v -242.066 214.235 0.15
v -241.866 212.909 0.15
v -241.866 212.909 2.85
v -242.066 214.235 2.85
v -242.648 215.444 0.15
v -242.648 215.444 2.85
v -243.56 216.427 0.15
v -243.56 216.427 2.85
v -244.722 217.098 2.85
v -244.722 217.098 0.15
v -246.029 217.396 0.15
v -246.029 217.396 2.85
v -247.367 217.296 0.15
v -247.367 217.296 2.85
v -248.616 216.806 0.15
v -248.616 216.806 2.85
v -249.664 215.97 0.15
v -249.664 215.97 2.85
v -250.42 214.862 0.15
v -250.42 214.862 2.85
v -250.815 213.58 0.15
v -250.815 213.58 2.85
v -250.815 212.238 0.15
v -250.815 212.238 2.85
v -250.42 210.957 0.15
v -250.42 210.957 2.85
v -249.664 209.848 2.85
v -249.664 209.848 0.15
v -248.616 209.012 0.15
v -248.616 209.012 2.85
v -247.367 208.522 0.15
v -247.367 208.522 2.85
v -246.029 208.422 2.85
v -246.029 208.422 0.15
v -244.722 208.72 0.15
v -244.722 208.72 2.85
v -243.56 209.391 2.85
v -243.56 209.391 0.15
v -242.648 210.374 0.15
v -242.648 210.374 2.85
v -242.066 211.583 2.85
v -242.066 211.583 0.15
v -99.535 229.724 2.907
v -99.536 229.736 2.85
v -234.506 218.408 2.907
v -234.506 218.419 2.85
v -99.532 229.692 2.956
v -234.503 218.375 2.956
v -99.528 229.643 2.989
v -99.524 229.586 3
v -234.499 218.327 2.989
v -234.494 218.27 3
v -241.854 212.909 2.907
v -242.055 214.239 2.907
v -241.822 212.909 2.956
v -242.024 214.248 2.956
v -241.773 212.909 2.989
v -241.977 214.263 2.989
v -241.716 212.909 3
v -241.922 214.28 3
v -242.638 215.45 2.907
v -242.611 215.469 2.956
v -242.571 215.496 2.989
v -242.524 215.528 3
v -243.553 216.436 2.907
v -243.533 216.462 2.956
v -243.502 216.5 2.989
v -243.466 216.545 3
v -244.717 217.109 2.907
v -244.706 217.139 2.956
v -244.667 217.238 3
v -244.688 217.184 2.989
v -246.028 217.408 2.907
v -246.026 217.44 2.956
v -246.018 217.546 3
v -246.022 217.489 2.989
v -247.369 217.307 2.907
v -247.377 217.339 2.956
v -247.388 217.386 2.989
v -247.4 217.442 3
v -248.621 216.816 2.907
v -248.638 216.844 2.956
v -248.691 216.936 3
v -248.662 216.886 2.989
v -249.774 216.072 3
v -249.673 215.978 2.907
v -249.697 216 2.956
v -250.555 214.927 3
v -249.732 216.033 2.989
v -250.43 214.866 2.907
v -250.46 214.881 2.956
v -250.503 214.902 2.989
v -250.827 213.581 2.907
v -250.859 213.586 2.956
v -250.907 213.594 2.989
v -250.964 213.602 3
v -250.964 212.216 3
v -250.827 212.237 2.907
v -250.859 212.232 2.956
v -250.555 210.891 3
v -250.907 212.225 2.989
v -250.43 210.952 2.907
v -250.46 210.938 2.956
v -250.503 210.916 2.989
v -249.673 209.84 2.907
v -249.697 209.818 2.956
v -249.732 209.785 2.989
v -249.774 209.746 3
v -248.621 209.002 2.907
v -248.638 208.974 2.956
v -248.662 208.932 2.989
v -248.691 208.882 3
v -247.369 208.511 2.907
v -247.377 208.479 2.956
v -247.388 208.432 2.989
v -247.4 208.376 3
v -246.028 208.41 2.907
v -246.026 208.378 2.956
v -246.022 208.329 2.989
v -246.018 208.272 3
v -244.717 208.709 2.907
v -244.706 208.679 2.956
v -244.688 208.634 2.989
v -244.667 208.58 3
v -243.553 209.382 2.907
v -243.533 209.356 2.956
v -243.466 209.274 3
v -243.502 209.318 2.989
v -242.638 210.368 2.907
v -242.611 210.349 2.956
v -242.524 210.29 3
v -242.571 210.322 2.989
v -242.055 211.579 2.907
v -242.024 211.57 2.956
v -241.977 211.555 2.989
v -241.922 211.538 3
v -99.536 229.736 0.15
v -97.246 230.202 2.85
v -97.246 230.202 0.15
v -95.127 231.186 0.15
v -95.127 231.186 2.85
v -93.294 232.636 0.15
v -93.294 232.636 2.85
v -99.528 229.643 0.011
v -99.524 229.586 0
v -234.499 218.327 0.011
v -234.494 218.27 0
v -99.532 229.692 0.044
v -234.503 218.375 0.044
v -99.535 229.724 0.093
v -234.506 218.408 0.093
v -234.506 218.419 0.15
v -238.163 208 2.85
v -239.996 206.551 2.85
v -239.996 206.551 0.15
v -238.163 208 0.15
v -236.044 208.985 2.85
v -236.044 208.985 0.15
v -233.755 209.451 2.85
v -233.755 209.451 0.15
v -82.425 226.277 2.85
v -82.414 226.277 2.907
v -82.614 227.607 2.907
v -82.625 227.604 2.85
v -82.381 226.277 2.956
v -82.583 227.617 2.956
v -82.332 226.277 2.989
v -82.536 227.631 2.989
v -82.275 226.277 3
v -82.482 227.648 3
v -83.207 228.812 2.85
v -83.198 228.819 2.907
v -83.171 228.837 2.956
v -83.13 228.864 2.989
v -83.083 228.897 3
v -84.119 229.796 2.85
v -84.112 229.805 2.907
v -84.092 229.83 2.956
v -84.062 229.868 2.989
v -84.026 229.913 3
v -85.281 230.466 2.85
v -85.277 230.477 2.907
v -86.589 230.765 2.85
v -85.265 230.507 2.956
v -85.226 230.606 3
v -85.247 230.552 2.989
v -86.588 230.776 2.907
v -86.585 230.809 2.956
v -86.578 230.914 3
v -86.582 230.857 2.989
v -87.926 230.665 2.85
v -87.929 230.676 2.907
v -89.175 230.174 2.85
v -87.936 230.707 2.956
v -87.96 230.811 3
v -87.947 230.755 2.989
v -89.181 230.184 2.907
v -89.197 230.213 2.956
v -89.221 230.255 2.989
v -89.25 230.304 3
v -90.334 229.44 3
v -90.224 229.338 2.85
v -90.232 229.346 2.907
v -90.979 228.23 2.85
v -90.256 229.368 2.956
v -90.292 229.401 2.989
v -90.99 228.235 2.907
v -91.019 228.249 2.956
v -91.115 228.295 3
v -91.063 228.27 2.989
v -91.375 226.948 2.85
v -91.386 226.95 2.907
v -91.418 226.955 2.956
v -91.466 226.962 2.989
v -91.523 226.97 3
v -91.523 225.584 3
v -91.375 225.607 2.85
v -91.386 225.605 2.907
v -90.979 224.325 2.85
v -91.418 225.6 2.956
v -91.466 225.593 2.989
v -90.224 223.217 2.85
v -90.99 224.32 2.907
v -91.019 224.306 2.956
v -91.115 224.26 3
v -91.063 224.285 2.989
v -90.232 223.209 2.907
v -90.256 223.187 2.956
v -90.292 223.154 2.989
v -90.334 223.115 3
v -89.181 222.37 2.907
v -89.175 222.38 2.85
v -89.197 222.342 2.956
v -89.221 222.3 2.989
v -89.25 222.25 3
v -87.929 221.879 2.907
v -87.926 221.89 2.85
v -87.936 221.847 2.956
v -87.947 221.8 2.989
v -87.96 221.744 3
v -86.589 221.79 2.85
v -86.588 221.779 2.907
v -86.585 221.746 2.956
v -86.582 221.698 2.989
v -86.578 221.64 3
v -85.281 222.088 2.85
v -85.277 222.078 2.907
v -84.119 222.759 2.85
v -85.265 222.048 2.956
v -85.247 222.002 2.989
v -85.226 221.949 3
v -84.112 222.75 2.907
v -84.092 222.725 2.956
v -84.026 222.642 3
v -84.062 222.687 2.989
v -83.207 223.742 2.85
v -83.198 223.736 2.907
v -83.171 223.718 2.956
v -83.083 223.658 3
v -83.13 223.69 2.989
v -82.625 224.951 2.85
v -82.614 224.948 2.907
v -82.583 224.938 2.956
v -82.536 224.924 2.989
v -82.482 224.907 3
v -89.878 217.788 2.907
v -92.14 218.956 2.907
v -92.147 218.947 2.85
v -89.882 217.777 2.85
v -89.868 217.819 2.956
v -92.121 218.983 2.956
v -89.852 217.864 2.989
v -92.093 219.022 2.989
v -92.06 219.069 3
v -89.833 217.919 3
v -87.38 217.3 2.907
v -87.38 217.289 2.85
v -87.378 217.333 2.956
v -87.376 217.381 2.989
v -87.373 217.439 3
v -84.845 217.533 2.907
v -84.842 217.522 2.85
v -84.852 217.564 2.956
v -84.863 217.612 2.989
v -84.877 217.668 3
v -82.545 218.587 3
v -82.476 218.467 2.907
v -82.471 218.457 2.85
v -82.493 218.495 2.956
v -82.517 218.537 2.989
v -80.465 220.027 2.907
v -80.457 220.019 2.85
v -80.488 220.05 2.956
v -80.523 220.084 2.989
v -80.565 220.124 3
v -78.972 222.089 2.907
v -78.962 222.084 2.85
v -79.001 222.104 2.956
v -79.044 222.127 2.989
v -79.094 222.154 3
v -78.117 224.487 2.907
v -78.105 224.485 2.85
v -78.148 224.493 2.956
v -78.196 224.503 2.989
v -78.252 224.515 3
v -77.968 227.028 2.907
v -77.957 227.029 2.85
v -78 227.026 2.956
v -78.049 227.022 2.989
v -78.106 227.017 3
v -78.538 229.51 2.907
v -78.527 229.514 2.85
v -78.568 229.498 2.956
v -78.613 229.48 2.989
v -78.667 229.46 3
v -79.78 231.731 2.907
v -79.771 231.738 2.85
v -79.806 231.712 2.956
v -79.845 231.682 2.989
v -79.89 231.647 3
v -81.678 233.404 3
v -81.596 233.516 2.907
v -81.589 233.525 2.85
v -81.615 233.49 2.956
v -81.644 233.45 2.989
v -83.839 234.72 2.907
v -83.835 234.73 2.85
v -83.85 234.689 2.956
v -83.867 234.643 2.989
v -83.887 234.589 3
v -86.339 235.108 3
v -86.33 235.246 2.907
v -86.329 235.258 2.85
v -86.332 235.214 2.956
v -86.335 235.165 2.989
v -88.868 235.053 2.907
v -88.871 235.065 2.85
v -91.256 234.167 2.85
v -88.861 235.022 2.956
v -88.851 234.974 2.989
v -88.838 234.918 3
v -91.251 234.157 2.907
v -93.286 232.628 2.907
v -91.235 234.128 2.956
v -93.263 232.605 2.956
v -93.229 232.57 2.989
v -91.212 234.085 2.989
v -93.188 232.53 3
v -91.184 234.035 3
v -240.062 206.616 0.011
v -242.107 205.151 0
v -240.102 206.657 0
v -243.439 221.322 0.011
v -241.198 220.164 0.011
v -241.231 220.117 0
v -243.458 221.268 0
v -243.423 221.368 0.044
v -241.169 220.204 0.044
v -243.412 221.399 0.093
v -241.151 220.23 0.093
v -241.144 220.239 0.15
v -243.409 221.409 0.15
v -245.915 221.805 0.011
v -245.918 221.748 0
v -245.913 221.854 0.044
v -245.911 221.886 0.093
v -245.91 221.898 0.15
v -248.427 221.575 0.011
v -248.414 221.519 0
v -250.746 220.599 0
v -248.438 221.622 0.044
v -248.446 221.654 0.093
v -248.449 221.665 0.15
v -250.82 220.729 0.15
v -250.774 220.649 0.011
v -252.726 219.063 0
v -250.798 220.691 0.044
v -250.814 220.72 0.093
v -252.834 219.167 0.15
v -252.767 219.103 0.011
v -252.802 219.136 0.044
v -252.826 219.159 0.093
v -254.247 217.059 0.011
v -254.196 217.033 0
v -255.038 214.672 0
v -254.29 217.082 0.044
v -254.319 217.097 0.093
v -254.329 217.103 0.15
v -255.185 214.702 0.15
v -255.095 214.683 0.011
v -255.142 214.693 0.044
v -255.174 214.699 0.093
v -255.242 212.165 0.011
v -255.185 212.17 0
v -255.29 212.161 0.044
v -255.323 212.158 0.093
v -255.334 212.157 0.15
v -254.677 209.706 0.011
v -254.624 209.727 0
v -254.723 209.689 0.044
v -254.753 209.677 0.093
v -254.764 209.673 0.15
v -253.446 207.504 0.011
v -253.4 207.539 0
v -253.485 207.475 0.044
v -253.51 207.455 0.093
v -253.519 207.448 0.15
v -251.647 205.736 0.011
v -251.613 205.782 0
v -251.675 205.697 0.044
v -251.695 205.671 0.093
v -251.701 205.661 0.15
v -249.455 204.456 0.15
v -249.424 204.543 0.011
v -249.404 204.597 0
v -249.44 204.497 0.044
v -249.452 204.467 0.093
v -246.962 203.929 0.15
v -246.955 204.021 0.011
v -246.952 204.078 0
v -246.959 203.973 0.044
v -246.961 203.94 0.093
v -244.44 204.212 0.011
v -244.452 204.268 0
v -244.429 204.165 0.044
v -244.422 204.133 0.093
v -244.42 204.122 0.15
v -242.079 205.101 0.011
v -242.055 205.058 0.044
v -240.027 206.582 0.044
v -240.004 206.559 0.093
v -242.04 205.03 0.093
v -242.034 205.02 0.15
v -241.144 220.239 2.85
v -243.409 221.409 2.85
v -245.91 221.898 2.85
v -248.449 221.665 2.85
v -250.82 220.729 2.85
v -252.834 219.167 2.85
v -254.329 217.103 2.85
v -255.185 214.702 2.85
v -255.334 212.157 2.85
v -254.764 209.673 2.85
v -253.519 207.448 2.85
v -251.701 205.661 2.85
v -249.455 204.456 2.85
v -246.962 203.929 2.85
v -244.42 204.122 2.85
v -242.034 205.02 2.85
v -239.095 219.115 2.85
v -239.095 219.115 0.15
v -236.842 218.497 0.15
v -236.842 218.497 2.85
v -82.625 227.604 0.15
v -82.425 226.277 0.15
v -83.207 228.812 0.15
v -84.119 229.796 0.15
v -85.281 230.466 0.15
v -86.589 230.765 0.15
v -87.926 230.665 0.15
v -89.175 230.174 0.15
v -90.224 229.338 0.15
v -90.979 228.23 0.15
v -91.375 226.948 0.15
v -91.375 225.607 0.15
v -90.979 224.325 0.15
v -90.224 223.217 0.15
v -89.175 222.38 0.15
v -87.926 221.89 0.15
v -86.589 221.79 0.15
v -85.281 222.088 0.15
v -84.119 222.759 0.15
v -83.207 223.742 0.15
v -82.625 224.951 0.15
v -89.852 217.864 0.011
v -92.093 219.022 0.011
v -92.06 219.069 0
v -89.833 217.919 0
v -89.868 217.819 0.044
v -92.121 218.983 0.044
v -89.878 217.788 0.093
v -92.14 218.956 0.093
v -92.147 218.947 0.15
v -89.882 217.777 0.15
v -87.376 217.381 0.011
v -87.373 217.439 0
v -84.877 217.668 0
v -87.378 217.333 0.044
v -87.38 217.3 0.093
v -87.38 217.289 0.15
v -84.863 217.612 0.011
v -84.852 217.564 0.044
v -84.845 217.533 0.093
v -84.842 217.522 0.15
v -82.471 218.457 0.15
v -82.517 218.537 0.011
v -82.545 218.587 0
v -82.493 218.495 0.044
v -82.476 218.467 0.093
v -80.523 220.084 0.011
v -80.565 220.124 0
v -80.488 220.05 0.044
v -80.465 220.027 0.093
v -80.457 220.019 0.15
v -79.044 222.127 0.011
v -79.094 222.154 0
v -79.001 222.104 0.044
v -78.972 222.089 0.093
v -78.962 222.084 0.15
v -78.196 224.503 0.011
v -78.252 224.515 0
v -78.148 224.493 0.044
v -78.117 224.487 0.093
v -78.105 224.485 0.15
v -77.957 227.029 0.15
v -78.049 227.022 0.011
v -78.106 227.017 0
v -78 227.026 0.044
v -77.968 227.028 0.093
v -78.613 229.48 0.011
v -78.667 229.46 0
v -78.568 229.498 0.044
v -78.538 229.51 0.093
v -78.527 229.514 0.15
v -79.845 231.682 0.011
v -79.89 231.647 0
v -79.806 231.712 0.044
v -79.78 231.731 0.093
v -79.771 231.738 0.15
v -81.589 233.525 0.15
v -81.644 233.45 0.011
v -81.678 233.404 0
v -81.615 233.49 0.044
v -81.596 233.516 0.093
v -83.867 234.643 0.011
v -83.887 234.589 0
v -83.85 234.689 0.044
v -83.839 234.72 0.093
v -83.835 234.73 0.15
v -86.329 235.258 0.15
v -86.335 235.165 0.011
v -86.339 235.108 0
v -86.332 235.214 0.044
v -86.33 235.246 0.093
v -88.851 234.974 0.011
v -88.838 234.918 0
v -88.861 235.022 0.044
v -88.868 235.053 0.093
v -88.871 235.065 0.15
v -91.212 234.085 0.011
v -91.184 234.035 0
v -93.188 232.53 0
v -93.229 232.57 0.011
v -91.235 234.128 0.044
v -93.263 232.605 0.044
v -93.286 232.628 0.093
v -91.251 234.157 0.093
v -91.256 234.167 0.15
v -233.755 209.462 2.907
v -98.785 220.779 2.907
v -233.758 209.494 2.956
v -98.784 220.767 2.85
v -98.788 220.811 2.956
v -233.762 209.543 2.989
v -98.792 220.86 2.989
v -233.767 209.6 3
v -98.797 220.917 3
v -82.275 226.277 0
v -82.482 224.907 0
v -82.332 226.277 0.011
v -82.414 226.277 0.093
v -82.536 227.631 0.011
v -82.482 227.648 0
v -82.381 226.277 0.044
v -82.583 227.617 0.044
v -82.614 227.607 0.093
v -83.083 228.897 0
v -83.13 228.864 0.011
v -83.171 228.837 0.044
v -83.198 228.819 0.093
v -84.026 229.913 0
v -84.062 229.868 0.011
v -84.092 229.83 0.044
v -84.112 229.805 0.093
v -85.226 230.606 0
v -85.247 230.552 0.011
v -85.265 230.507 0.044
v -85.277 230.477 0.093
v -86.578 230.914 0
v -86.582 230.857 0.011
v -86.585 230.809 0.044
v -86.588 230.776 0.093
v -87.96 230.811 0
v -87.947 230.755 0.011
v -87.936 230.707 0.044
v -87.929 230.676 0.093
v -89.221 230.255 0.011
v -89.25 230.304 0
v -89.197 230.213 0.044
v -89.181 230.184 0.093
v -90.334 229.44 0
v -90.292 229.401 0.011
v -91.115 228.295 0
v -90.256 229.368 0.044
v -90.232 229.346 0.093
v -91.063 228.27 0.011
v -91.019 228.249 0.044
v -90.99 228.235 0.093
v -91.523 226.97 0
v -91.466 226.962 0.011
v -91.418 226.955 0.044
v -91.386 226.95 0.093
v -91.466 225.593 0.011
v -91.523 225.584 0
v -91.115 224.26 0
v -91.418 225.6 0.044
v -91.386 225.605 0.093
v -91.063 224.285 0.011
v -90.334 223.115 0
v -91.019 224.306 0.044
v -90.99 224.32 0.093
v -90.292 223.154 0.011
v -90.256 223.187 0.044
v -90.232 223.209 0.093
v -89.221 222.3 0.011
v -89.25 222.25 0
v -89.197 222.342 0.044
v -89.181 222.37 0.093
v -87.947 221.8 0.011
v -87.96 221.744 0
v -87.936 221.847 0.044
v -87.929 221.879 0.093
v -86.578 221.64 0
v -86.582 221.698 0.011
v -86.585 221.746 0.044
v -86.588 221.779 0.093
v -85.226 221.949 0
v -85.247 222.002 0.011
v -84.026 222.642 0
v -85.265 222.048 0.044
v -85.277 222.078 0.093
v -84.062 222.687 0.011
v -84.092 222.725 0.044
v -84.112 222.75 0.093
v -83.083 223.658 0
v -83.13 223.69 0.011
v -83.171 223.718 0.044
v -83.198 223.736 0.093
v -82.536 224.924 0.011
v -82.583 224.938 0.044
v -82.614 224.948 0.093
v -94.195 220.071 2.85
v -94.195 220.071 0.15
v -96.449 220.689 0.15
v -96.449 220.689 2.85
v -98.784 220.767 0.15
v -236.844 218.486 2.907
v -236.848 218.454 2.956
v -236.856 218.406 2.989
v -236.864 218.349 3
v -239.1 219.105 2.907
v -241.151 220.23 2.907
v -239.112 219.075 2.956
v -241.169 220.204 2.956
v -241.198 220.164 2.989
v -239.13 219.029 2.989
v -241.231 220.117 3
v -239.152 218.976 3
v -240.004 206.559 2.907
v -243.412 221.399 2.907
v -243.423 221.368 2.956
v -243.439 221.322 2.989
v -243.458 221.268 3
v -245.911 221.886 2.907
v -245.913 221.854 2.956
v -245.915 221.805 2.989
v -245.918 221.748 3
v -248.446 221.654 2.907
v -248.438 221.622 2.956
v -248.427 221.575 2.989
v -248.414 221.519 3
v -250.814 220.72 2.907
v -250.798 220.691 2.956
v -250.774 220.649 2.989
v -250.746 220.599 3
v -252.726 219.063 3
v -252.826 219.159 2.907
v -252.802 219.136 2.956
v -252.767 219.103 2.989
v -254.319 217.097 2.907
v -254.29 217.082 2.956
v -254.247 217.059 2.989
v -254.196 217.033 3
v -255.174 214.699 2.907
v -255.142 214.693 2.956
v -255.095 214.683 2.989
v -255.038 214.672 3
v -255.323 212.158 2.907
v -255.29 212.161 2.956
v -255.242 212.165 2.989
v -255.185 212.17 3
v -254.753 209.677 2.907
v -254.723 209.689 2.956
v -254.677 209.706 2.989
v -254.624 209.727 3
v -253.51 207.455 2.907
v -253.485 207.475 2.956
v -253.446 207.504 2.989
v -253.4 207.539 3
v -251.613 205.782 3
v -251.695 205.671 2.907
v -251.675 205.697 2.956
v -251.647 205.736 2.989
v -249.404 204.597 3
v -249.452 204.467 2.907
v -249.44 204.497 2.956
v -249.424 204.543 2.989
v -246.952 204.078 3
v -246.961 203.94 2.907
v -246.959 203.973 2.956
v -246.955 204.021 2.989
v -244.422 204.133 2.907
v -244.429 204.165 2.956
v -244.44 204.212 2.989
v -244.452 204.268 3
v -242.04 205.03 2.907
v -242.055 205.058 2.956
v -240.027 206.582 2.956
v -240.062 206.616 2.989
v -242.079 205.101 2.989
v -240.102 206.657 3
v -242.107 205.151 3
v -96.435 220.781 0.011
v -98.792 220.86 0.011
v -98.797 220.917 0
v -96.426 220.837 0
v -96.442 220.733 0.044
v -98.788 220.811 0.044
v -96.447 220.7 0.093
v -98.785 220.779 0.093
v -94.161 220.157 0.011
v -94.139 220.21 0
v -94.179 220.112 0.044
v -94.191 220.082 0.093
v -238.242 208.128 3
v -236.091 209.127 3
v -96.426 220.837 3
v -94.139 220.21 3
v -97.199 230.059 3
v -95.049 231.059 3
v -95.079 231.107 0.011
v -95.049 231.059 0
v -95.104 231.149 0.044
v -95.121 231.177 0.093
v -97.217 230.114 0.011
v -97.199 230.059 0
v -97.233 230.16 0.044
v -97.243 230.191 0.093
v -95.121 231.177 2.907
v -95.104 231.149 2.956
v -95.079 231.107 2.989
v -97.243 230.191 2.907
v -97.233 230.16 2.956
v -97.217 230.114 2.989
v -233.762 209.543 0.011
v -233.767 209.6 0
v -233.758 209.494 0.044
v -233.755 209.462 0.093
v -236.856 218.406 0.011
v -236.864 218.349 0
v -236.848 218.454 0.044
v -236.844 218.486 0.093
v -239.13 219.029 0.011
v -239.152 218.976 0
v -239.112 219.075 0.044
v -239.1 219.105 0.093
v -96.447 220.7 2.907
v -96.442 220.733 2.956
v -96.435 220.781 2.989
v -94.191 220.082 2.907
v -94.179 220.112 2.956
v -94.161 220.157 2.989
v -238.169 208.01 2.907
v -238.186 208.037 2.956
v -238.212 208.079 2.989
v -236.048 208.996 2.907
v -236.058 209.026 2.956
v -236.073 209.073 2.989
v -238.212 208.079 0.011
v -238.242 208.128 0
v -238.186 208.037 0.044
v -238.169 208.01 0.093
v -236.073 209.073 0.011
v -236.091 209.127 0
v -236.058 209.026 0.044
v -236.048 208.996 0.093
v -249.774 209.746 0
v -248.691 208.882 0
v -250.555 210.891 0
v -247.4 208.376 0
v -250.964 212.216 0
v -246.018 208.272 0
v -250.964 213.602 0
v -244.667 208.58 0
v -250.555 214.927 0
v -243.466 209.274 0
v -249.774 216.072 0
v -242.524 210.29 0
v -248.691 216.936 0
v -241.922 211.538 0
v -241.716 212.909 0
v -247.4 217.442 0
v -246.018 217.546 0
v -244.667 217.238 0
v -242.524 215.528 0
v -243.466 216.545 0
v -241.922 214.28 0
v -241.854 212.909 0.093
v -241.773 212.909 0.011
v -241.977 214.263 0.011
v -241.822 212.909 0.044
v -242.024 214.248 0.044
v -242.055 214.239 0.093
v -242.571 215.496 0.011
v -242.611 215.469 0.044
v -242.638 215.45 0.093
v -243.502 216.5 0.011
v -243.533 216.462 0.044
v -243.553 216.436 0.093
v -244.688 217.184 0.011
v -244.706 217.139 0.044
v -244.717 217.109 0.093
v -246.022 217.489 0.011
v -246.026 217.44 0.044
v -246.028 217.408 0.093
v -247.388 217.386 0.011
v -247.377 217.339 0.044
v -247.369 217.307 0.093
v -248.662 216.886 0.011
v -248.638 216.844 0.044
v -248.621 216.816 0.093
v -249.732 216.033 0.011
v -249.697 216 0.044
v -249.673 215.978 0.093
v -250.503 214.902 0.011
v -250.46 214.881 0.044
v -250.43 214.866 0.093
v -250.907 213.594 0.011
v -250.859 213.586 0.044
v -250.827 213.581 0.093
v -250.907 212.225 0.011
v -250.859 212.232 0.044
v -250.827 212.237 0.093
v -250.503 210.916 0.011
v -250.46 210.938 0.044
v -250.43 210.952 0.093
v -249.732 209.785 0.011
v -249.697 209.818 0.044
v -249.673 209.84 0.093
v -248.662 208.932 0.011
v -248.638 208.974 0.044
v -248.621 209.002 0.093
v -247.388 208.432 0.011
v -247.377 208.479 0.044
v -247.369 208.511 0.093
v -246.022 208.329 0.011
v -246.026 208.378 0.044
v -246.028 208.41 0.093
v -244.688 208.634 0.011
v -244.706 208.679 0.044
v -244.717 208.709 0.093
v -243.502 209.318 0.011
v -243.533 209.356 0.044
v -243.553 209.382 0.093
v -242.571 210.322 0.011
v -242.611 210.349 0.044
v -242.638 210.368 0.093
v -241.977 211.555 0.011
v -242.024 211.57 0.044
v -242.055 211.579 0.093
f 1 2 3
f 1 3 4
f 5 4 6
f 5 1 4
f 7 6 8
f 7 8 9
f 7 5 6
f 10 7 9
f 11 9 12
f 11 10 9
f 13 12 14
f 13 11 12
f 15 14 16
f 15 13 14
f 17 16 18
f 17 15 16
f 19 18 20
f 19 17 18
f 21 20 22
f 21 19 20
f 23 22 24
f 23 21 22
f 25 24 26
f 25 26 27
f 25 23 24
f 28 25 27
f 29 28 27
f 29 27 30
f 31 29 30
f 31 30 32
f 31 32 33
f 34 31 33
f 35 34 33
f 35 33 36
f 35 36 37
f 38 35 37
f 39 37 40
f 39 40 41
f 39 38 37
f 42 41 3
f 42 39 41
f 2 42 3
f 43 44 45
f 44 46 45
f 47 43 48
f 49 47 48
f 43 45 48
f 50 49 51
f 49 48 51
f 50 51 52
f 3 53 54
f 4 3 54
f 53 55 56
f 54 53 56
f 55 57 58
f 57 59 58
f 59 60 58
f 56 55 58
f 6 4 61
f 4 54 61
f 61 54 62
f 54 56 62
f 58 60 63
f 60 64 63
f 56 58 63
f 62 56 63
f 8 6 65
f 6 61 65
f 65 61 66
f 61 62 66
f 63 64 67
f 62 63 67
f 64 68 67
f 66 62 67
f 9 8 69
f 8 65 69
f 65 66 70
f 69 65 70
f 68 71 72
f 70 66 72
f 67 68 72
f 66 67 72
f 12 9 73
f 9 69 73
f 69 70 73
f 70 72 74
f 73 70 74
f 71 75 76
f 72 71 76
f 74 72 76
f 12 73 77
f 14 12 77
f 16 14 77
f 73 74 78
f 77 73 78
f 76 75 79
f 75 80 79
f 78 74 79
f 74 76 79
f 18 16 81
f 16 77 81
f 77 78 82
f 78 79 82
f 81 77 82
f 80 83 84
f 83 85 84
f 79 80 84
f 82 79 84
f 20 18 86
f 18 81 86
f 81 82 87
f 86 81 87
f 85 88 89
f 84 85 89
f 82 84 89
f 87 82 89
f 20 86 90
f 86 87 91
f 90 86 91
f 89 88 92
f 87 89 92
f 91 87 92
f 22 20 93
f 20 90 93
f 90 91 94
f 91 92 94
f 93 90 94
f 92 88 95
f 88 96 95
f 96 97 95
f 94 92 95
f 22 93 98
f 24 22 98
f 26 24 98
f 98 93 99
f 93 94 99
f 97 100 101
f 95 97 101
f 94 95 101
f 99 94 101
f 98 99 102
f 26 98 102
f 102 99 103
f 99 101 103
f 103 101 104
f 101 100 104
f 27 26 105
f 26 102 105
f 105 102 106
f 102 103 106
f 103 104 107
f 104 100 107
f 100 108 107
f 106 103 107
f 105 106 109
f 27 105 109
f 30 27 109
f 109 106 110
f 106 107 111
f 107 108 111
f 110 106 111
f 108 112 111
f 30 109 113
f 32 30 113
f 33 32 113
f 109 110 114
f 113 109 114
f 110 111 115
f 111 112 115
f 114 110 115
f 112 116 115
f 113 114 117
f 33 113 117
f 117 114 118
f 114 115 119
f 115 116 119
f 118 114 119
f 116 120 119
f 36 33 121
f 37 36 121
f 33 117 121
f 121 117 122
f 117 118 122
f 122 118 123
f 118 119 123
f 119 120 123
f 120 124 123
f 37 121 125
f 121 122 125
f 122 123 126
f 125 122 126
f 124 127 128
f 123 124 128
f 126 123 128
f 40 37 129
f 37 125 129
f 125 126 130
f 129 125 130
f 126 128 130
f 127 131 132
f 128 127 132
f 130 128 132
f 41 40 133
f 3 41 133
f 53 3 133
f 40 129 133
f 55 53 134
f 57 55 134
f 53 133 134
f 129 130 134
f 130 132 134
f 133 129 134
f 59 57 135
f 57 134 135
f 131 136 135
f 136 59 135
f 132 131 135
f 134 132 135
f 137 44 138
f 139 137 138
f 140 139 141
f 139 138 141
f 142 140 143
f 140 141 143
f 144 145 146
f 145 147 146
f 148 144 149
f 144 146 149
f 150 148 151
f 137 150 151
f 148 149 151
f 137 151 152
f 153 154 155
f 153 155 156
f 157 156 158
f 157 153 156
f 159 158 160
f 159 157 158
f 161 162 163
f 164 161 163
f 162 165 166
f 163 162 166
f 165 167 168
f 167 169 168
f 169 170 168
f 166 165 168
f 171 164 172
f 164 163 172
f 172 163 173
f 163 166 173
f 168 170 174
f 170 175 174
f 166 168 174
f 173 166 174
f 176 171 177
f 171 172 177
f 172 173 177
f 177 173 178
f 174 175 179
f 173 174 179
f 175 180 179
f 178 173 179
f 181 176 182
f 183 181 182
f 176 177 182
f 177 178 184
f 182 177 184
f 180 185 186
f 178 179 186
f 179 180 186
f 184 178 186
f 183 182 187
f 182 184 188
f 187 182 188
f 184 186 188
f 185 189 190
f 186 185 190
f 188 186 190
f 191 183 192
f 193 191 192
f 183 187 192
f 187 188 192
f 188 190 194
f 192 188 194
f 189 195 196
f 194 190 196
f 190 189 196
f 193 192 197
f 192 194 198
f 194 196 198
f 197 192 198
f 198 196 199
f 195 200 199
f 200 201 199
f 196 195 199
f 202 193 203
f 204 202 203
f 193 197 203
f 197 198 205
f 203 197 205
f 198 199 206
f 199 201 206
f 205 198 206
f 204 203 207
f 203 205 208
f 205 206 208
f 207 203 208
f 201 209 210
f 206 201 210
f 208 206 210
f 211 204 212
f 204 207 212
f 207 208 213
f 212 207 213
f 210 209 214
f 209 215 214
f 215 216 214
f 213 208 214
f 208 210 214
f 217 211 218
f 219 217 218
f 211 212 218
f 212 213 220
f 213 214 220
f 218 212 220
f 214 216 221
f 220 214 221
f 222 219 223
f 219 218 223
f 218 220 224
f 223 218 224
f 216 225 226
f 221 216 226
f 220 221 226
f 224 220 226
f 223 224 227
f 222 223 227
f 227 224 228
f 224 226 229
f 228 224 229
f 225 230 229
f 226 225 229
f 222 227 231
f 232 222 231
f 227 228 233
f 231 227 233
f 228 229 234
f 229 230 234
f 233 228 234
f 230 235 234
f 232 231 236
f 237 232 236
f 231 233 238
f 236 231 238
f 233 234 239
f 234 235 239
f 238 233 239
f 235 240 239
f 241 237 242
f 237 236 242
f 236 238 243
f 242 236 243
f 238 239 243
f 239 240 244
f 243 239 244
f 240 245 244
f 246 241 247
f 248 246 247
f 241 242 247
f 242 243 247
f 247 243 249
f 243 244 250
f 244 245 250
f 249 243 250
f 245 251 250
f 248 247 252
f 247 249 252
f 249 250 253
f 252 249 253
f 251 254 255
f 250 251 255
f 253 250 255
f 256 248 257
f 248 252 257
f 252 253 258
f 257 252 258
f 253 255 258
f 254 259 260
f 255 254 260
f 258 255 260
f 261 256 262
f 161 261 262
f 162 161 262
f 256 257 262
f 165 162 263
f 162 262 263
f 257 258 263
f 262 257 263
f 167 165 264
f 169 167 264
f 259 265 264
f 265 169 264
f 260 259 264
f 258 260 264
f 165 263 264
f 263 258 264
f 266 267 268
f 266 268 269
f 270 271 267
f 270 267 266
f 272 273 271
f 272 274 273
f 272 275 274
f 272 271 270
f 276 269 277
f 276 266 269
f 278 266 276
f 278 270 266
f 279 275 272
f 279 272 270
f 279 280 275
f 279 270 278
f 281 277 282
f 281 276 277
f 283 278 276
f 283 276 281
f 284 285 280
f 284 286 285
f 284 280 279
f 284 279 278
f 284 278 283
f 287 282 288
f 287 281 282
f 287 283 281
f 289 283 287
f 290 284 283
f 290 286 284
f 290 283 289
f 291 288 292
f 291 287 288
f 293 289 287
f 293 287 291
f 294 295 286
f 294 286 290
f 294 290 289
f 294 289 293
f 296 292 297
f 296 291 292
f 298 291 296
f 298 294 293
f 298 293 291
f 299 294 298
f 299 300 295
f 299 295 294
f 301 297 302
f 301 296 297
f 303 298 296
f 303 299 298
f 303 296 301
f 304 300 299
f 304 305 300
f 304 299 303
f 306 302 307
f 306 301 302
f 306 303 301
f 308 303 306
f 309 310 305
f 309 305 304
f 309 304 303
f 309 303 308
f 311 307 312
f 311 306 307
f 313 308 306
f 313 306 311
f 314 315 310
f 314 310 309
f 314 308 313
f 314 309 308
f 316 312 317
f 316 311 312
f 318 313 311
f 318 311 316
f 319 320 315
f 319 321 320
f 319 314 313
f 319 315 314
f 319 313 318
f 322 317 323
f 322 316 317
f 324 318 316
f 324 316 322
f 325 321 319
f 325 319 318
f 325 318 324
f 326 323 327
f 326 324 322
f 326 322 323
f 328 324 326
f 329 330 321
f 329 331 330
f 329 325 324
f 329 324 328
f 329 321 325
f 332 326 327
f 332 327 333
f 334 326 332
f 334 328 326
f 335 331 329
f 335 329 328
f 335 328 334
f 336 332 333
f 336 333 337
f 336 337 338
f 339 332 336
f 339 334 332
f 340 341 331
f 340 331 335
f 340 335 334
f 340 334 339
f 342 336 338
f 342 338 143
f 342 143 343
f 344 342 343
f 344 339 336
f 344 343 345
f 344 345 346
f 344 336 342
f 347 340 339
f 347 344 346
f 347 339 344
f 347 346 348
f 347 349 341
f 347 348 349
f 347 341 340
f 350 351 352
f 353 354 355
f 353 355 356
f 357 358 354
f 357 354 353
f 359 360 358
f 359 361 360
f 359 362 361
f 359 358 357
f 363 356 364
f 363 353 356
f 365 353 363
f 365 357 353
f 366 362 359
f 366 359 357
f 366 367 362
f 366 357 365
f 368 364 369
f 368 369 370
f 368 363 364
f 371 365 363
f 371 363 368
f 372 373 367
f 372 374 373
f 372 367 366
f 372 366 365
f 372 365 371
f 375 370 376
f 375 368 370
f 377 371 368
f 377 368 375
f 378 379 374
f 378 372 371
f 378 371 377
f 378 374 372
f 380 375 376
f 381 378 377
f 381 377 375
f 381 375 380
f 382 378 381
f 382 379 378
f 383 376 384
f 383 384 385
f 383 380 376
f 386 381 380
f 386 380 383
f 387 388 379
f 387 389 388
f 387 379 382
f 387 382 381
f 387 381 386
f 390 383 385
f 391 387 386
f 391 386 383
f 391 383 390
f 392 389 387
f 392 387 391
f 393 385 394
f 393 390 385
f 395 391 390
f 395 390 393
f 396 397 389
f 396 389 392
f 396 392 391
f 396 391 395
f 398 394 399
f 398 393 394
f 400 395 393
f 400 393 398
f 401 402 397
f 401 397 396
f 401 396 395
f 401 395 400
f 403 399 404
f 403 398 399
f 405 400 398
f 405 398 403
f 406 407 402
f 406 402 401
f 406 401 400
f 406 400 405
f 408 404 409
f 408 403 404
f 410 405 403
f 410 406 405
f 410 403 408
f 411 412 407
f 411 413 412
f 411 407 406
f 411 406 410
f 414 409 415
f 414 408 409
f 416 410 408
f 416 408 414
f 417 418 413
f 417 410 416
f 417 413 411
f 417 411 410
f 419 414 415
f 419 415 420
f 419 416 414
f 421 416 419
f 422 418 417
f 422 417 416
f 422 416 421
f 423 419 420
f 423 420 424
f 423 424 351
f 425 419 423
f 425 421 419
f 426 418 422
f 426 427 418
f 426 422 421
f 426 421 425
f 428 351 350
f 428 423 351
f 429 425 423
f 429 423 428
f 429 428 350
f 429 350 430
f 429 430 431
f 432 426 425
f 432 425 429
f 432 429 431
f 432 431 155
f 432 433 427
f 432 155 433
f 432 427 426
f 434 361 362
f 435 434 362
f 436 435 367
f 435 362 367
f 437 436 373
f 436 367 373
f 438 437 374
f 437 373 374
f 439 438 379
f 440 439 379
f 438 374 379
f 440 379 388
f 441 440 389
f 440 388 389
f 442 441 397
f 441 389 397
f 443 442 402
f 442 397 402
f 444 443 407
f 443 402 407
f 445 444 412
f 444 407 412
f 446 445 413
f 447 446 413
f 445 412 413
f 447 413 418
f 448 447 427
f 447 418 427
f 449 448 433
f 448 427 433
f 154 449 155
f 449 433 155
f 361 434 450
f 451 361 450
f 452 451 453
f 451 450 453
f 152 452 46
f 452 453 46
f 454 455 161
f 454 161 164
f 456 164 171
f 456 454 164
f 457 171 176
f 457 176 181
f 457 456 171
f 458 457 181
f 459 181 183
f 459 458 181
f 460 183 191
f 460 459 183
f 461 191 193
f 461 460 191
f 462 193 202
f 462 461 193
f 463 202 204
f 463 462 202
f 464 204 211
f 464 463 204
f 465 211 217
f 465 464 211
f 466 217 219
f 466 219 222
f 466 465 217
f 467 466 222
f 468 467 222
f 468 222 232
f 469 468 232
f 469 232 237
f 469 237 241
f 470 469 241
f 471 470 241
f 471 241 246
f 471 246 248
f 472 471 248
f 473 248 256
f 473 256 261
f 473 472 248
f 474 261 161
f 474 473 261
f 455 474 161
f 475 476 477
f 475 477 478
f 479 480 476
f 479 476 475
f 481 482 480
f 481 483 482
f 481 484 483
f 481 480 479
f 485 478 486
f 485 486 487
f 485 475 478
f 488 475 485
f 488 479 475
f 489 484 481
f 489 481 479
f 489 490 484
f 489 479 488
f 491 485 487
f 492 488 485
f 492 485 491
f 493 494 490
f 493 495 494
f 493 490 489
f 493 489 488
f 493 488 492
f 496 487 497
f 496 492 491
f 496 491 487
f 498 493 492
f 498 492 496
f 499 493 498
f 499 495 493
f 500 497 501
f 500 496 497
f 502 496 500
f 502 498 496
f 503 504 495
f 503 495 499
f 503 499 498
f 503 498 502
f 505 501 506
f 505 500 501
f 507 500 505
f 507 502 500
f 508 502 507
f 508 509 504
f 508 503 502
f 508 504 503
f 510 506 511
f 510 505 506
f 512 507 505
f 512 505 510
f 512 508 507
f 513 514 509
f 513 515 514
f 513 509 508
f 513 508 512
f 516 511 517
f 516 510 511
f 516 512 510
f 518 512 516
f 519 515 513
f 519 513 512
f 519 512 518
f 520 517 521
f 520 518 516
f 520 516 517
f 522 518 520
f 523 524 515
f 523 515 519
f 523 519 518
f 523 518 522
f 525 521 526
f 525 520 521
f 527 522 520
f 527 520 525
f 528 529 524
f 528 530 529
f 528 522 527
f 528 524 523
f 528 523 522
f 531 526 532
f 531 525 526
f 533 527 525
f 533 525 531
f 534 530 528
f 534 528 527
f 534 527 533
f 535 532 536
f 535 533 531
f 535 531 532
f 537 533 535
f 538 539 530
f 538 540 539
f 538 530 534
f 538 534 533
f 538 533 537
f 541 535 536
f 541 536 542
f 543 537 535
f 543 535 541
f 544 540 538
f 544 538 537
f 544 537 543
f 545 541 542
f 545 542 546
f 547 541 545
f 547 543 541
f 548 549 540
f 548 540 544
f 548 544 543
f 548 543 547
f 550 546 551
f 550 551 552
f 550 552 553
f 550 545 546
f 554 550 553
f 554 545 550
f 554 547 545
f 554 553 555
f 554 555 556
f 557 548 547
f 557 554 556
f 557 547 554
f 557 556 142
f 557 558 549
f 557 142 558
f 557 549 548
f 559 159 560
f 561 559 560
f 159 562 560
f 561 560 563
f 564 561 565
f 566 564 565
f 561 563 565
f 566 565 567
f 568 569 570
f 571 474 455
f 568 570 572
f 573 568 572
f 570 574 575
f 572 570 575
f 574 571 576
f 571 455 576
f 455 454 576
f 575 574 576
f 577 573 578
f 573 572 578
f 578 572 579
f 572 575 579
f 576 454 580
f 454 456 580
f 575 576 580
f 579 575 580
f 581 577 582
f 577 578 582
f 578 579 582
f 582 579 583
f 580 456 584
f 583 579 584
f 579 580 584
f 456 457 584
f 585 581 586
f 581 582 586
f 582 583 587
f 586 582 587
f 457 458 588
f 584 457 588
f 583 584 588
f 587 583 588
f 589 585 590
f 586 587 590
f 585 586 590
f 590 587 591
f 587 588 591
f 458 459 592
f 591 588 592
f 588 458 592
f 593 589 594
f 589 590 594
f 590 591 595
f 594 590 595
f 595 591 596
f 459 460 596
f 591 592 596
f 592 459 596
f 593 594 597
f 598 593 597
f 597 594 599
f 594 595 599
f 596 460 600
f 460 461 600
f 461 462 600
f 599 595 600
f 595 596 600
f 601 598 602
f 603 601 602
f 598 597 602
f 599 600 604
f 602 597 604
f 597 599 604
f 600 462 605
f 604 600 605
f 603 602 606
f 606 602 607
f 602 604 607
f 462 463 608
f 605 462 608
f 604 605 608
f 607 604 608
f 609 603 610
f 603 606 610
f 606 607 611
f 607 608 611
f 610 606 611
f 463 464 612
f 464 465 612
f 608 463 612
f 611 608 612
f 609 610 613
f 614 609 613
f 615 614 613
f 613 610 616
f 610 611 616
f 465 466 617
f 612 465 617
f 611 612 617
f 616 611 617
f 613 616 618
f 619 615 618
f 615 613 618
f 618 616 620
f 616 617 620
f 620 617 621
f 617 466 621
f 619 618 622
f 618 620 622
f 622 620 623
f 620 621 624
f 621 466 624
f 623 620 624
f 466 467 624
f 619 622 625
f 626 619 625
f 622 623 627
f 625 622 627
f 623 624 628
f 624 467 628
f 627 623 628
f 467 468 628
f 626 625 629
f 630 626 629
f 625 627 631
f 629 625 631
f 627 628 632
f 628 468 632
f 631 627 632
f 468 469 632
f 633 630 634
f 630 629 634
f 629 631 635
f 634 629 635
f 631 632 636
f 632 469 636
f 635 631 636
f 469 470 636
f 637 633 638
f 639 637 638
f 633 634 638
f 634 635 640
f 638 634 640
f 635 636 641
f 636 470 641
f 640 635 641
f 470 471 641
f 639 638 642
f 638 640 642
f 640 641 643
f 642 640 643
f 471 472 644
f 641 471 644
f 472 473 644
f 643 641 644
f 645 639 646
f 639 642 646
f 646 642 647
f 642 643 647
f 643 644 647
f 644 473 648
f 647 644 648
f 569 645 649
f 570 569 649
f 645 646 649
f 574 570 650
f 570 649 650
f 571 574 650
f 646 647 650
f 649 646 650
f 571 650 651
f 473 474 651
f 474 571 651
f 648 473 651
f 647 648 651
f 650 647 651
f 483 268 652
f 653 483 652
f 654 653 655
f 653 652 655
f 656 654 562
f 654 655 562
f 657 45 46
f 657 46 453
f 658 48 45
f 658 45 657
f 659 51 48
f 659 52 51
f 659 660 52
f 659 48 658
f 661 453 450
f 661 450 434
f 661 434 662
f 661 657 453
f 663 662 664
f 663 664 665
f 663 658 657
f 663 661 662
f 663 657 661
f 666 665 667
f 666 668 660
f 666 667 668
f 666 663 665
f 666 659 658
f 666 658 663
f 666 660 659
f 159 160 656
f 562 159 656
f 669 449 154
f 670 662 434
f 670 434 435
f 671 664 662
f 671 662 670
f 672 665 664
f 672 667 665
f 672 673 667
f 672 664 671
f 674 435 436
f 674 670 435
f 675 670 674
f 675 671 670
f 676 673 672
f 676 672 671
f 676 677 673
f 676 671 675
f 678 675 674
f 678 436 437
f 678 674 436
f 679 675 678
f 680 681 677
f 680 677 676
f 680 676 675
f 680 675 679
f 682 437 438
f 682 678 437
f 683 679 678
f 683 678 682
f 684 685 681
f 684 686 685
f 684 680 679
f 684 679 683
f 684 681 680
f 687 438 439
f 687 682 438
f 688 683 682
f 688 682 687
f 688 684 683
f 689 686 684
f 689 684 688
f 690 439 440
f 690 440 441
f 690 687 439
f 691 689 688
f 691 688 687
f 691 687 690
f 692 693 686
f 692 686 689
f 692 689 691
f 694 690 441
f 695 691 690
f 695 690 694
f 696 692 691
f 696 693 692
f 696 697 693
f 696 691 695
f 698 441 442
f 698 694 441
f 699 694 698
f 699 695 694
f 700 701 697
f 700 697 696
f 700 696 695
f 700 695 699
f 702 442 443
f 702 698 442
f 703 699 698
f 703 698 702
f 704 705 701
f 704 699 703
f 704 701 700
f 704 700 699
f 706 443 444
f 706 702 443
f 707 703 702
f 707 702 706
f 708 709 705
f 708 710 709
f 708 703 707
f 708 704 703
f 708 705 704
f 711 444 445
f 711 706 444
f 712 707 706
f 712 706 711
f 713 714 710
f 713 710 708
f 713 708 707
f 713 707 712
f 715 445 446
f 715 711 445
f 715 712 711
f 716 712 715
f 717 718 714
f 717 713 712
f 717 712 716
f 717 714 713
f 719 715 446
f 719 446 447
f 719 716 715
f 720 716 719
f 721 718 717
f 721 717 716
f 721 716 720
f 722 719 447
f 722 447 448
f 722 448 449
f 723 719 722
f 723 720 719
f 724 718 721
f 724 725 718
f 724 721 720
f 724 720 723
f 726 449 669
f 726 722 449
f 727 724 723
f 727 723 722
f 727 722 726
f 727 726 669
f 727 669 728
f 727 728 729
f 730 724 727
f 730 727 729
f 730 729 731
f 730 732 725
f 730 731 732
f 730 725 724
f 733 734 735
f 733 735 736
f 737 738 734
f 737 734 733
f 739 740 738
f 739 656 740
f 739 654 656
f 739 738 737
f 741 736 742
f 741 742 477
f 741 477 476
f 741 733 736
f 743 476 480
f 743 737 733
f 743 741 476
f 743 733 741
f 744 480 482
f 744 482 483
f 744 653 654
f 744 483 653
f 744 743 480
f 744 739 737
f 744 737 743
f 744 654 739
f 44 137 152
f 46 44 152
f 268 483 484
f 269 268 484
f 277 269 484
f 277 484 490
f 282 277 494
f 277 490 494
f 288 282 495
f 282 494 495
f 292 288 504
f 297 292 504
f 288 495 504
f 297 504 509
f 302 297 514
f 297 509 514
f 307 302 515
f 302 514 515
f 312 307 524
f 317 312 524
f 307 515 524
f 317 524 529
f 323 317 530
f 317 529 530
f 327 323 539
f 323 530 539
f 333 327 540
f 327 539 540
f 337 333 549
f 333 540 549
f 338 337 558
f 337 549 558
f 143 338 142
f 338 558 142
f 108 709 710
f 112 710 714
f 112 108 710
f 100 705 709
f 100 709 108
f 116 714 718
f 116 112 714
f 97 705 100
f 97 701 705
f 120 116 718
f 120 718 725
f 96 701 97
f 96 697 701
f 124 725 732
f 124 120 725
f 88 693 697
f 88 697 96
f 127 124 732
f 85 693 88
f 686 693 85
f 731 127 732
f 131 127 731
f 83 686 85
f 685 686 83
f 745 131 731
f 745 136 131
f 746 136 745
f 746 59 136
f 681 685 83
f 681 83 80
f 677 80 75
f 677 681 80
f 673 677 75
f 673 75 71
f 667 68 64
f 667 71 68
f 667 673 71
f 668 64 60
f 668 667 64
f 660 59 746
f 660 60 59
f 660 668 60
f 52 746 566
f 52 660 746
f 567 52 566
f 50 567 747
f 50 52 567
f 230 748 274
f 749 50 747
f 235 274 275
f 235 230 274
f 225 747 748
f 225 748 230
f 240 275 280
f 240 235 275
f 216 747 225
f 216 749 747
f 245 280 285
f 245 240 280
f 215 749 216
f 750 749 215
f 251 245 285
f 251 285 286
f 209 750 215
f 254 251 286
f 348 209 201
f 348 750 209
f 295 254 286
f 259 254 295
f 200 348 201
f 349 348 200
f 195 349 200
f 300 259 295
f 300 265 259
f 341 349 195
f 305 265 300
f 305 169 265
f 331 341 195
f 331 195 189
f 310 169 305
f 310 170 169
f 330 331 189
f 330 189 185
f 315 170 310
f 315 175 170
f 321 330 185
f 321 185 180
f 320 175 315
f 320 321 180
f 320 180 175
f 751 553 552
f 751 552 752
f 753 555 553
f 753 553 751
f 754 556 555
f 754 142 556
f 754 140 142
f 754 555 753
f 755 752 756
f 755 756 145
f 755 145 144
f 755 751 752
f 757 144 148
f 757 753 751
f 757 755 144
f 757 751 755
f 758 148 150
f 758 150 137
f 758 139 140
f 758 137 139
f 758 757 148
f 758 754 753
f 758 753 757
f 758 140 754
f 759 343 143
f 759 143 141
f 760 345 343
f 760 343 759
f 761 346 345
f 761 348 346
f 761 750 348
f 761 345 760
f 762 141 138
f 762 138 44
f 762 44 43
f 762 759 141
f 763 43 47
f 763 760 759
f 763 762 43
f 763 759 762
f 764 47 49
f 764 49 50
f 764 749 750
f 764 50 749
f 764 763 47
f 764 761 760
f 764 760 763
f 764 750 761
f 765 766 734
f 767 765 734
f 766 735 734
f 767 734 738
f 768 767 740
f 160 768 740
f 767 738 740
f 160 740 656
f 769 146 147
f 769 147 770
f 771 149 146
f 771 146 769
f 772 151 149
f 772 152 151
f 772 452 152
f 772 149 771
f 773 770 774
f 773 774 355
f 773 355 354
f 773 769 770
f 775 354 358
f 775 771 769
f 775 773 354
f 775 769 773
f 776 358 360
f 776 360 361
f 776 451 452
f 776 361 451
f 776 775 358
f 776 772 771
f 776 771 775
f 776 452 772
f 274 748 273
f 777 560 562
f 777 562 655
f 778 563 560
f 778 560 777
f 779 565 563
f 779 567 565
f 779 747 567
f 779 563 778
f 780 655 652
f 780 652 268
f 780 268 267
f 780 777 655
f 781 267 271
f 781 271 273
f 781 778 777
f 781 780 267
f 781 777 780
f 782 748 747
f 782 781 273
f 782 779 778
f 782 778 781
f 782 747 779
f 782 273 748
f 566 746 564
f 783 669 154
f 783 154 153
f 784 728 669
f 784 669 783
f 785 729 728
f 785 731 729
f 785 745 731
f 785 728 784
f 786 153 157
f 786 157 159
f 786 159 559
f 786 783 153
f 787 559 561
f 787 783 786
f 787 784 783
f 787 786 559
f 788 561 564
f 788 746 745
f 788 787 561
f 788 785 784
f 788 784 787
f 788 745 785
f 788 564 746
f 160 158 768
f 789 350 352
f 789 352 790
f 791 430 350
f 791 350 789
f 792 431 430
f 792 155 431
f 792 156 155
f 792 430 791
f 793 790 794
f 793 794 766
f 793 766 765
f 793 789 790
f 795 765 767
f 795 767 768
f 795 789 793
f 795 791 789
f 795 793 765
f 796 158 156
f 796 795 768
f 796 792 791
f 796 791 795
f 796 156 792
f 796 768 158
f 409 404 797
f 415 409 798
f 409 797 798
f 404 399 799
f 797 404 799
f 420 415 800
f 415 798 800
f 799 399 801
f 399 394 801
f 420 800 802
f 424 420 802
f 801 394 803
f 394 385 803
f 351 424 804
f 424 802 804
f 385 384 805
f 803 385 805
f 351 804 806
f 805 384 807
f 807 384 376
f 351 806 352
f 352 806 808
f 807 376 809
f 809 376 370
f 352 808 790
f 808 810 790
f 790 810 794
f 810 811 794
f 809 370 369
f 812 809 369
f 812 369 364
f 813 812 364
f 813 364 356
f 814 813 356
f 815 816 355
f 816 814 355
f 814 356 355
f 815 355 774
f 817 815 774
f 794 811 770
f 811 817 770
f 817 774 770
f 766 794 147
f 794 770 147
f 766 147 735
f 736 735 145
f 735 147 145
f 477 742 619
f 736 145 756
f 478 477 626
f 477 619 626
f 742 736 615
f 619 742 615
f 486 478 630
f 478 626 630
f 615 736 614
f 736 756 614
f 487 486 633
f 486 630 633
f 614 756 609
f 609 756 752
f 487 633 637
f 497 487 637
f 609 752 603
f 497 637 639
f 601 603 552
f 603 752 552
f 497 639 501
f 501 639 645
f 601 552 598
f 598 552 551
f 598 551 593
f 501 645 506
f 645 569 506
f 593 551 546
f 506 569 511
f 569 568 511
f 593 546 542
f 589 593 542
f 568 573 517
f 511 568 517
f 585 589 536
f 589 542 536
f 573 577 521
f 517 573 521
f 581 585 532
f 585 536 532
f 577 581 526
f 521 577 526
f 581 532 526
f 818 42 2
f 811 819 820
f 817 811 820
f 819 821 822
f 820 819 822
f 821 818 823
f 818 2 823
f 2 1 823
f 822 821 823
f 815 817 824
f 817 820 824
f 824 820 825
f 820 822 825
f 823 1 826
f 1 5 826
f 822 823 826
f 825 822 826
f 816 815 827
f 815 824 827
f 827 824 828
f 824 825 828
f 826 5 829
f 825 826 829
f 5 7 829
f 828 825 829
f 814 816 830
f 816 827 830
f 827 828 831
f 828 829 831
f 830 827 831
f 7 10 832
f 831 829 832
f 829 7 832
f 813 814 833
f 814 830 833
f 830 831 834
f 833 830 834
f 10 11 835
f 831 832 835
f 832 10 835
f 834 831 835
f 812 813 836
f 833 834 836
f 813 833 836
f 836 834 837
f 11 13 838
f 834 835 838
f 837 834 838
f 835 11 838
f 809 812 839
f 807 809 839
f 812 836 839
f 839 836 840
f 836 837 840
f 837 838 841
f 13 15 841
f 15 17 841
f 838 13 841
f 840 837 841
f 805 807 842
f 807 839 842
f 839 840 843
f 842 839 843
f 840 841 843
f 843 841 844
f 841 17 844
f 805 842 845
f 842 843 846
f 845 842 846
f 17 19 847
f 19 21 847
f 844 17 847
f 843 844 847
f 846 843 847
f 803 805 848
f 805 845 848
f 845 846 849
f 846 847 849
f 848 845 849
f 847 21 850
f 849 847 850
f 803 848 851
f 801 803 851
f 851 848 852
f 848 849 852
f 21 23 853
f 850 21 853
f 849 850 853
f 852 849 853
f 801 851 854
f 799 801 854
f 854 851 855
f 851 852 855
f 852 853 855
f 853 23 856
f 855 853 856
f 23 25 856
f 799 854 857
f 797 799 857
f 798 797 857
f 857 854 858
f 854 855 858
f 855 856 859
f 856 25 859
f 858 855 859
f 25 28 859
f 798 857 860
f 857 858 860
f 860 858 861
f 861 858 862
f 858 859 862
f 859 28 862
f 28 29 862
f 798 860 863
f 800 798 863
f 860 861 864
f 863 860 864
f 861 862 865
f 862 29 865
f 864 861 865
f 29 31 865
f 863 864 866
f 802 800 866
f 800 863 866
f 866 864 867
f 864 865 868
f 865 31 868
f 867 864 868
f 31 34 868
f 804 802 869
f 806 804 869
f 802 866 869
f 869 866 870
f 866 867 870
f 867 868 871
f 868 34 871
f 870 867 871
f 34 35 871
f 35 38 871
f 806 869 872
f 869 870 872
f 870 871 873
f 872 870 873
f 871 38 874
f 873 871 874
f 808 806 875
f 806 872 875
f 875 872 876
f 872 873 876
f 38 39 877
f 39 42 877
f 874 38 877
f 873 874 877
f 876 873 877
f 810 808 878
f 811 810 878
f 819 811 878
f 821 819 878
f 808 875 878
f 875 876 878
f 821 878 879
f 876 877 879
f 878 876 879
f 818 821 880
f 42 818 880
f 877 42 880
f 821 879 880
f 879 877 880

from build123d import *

# Parameters (mm, degrees)
SZKIC2_R                    = 4.5
DODANIE_WYCI_GNI_CIE1_DEPTH = 3
ZAOKR_GLENIE1_R             = 10
ZAOKR_GLENIE2_R             = 10
ZAOKR_GLENIE3_R             = 10
ZAOKR_GLENIE4_R             = 10
ZAOKR_GLENIE5_R             = 0.15


with BuildPart() as part:
    # Szkic2 → Dodanie-wyciągnięcie1 (new body)
    with BuildSketch(Plane.XY):
        with BuildLine():
            ThreePointArc((-238.974611052, 218.044531173), (-255.334133629, 212.157075316), (-238.222643555, 209.076000363))
            Line((-238.222643555, 209.076000363), (-94.31604686, 221.141865505))
            ThreePointArc((-94.31604686, 221.141865505), (-77.956524282, 227.029321361), (-95.068014356, 230.110396314))
            Line((-95.068014356, 230.110396314), (-238.974611052, 218.044531173))
        make_face()
        with Locations((-246.36560282, 212.909042813)):
            Circle(SZKIC2_R, mode=Mode.SUBTRACT)
        with Locations((-86.925055092, 226.277353864)):
            Circle(SZKIC2_R, mode=Mode.SUBTRACT)
    extrude(amount=DODANIE_WYCI_GNI_CIE1_DEPTH)

    # Zaokrąglenie1
    zaokr_glenie1_edges = [part.edges().sort_by_distance(p)[0] for p in [
        (-238.974611052, 218.044531173, 1.5),
    ]]
    fillet(zaokr_glenie1_edges, radius=ZAOKR_GLENIE1_R)

    # Zaokrąglenie2
    zaokr_glenie2_edges = [part.edges().sort_by_distance(p)[0] for p in [
        (-238.222643555, 209.076000363, 1.5),
    ]]
    fillet(zaokr_glenie2_edges, radius=ZAOKR_GLENIE2_R)

    # Zaokrąglenie3
    zaokr_glenie3_edges = [part.edges().sort_by_distance(p)[0] for p in [
        (-95.068014356, 230.110396314, 1.5),
    ]]
    fillet(zaokr_glenie3_edges, radius=ZAOKR_GLENIE3_R)

    # Zaokrąglenie4
    zaokr_glenie4_edges = [part.edges().sort_by_distance(p)[0] for p in [
        (-94.31604686, 221.141865505, 1.5),
    ]]
    fillet(zaokr_glenie4_edges, radius=ZAOKR_GLENIE4_R)

    # Zaokrąglenie5
    zaokr_glenie5_edges = [part.edges().sort_by_distance(p)[0] for p in [
        (-91.425055092, 226.277353864, 0),
        (-255.334133629, 212.157075316, 0),
        (-255.334133629, 212.157075316, 3),
        (-167.021312704, 224.077463743, 0),
        (-167.021312704, 224.077463743, 3),
        (-237.986721831, 218.740260342, 0),
        (-237.986721831, 218.740260342, 3),
        (-250.86560282, 212.909042813, 3),
        (-166.269345207, 215.108932934, 0),
        (-166.269345207, 215.108932934, 3),
        (-237.132694559, 208.554487777, 0),
        (-237.132694559, 208.554487777, 3),
        (-96.157963353, 230.6319089, 0),
        (-96.157963353, 230.6319089, 3),
        (-77.956524282, 227.029321361, 0),
        (-77.956524282, 227.029321361, 3),
        (-95.303936081, 220.446136335, 0),
        (-95.303936081, 220.446136335, 3),
        (-91.425055092, 226.277353864, 3),
        (-250.86560282, 212.909042813, 0),
    ]]
    fillet(zaokr_glenie5_edges, radius=ZAOKR_GLENIE5_R)


solid = part.part
